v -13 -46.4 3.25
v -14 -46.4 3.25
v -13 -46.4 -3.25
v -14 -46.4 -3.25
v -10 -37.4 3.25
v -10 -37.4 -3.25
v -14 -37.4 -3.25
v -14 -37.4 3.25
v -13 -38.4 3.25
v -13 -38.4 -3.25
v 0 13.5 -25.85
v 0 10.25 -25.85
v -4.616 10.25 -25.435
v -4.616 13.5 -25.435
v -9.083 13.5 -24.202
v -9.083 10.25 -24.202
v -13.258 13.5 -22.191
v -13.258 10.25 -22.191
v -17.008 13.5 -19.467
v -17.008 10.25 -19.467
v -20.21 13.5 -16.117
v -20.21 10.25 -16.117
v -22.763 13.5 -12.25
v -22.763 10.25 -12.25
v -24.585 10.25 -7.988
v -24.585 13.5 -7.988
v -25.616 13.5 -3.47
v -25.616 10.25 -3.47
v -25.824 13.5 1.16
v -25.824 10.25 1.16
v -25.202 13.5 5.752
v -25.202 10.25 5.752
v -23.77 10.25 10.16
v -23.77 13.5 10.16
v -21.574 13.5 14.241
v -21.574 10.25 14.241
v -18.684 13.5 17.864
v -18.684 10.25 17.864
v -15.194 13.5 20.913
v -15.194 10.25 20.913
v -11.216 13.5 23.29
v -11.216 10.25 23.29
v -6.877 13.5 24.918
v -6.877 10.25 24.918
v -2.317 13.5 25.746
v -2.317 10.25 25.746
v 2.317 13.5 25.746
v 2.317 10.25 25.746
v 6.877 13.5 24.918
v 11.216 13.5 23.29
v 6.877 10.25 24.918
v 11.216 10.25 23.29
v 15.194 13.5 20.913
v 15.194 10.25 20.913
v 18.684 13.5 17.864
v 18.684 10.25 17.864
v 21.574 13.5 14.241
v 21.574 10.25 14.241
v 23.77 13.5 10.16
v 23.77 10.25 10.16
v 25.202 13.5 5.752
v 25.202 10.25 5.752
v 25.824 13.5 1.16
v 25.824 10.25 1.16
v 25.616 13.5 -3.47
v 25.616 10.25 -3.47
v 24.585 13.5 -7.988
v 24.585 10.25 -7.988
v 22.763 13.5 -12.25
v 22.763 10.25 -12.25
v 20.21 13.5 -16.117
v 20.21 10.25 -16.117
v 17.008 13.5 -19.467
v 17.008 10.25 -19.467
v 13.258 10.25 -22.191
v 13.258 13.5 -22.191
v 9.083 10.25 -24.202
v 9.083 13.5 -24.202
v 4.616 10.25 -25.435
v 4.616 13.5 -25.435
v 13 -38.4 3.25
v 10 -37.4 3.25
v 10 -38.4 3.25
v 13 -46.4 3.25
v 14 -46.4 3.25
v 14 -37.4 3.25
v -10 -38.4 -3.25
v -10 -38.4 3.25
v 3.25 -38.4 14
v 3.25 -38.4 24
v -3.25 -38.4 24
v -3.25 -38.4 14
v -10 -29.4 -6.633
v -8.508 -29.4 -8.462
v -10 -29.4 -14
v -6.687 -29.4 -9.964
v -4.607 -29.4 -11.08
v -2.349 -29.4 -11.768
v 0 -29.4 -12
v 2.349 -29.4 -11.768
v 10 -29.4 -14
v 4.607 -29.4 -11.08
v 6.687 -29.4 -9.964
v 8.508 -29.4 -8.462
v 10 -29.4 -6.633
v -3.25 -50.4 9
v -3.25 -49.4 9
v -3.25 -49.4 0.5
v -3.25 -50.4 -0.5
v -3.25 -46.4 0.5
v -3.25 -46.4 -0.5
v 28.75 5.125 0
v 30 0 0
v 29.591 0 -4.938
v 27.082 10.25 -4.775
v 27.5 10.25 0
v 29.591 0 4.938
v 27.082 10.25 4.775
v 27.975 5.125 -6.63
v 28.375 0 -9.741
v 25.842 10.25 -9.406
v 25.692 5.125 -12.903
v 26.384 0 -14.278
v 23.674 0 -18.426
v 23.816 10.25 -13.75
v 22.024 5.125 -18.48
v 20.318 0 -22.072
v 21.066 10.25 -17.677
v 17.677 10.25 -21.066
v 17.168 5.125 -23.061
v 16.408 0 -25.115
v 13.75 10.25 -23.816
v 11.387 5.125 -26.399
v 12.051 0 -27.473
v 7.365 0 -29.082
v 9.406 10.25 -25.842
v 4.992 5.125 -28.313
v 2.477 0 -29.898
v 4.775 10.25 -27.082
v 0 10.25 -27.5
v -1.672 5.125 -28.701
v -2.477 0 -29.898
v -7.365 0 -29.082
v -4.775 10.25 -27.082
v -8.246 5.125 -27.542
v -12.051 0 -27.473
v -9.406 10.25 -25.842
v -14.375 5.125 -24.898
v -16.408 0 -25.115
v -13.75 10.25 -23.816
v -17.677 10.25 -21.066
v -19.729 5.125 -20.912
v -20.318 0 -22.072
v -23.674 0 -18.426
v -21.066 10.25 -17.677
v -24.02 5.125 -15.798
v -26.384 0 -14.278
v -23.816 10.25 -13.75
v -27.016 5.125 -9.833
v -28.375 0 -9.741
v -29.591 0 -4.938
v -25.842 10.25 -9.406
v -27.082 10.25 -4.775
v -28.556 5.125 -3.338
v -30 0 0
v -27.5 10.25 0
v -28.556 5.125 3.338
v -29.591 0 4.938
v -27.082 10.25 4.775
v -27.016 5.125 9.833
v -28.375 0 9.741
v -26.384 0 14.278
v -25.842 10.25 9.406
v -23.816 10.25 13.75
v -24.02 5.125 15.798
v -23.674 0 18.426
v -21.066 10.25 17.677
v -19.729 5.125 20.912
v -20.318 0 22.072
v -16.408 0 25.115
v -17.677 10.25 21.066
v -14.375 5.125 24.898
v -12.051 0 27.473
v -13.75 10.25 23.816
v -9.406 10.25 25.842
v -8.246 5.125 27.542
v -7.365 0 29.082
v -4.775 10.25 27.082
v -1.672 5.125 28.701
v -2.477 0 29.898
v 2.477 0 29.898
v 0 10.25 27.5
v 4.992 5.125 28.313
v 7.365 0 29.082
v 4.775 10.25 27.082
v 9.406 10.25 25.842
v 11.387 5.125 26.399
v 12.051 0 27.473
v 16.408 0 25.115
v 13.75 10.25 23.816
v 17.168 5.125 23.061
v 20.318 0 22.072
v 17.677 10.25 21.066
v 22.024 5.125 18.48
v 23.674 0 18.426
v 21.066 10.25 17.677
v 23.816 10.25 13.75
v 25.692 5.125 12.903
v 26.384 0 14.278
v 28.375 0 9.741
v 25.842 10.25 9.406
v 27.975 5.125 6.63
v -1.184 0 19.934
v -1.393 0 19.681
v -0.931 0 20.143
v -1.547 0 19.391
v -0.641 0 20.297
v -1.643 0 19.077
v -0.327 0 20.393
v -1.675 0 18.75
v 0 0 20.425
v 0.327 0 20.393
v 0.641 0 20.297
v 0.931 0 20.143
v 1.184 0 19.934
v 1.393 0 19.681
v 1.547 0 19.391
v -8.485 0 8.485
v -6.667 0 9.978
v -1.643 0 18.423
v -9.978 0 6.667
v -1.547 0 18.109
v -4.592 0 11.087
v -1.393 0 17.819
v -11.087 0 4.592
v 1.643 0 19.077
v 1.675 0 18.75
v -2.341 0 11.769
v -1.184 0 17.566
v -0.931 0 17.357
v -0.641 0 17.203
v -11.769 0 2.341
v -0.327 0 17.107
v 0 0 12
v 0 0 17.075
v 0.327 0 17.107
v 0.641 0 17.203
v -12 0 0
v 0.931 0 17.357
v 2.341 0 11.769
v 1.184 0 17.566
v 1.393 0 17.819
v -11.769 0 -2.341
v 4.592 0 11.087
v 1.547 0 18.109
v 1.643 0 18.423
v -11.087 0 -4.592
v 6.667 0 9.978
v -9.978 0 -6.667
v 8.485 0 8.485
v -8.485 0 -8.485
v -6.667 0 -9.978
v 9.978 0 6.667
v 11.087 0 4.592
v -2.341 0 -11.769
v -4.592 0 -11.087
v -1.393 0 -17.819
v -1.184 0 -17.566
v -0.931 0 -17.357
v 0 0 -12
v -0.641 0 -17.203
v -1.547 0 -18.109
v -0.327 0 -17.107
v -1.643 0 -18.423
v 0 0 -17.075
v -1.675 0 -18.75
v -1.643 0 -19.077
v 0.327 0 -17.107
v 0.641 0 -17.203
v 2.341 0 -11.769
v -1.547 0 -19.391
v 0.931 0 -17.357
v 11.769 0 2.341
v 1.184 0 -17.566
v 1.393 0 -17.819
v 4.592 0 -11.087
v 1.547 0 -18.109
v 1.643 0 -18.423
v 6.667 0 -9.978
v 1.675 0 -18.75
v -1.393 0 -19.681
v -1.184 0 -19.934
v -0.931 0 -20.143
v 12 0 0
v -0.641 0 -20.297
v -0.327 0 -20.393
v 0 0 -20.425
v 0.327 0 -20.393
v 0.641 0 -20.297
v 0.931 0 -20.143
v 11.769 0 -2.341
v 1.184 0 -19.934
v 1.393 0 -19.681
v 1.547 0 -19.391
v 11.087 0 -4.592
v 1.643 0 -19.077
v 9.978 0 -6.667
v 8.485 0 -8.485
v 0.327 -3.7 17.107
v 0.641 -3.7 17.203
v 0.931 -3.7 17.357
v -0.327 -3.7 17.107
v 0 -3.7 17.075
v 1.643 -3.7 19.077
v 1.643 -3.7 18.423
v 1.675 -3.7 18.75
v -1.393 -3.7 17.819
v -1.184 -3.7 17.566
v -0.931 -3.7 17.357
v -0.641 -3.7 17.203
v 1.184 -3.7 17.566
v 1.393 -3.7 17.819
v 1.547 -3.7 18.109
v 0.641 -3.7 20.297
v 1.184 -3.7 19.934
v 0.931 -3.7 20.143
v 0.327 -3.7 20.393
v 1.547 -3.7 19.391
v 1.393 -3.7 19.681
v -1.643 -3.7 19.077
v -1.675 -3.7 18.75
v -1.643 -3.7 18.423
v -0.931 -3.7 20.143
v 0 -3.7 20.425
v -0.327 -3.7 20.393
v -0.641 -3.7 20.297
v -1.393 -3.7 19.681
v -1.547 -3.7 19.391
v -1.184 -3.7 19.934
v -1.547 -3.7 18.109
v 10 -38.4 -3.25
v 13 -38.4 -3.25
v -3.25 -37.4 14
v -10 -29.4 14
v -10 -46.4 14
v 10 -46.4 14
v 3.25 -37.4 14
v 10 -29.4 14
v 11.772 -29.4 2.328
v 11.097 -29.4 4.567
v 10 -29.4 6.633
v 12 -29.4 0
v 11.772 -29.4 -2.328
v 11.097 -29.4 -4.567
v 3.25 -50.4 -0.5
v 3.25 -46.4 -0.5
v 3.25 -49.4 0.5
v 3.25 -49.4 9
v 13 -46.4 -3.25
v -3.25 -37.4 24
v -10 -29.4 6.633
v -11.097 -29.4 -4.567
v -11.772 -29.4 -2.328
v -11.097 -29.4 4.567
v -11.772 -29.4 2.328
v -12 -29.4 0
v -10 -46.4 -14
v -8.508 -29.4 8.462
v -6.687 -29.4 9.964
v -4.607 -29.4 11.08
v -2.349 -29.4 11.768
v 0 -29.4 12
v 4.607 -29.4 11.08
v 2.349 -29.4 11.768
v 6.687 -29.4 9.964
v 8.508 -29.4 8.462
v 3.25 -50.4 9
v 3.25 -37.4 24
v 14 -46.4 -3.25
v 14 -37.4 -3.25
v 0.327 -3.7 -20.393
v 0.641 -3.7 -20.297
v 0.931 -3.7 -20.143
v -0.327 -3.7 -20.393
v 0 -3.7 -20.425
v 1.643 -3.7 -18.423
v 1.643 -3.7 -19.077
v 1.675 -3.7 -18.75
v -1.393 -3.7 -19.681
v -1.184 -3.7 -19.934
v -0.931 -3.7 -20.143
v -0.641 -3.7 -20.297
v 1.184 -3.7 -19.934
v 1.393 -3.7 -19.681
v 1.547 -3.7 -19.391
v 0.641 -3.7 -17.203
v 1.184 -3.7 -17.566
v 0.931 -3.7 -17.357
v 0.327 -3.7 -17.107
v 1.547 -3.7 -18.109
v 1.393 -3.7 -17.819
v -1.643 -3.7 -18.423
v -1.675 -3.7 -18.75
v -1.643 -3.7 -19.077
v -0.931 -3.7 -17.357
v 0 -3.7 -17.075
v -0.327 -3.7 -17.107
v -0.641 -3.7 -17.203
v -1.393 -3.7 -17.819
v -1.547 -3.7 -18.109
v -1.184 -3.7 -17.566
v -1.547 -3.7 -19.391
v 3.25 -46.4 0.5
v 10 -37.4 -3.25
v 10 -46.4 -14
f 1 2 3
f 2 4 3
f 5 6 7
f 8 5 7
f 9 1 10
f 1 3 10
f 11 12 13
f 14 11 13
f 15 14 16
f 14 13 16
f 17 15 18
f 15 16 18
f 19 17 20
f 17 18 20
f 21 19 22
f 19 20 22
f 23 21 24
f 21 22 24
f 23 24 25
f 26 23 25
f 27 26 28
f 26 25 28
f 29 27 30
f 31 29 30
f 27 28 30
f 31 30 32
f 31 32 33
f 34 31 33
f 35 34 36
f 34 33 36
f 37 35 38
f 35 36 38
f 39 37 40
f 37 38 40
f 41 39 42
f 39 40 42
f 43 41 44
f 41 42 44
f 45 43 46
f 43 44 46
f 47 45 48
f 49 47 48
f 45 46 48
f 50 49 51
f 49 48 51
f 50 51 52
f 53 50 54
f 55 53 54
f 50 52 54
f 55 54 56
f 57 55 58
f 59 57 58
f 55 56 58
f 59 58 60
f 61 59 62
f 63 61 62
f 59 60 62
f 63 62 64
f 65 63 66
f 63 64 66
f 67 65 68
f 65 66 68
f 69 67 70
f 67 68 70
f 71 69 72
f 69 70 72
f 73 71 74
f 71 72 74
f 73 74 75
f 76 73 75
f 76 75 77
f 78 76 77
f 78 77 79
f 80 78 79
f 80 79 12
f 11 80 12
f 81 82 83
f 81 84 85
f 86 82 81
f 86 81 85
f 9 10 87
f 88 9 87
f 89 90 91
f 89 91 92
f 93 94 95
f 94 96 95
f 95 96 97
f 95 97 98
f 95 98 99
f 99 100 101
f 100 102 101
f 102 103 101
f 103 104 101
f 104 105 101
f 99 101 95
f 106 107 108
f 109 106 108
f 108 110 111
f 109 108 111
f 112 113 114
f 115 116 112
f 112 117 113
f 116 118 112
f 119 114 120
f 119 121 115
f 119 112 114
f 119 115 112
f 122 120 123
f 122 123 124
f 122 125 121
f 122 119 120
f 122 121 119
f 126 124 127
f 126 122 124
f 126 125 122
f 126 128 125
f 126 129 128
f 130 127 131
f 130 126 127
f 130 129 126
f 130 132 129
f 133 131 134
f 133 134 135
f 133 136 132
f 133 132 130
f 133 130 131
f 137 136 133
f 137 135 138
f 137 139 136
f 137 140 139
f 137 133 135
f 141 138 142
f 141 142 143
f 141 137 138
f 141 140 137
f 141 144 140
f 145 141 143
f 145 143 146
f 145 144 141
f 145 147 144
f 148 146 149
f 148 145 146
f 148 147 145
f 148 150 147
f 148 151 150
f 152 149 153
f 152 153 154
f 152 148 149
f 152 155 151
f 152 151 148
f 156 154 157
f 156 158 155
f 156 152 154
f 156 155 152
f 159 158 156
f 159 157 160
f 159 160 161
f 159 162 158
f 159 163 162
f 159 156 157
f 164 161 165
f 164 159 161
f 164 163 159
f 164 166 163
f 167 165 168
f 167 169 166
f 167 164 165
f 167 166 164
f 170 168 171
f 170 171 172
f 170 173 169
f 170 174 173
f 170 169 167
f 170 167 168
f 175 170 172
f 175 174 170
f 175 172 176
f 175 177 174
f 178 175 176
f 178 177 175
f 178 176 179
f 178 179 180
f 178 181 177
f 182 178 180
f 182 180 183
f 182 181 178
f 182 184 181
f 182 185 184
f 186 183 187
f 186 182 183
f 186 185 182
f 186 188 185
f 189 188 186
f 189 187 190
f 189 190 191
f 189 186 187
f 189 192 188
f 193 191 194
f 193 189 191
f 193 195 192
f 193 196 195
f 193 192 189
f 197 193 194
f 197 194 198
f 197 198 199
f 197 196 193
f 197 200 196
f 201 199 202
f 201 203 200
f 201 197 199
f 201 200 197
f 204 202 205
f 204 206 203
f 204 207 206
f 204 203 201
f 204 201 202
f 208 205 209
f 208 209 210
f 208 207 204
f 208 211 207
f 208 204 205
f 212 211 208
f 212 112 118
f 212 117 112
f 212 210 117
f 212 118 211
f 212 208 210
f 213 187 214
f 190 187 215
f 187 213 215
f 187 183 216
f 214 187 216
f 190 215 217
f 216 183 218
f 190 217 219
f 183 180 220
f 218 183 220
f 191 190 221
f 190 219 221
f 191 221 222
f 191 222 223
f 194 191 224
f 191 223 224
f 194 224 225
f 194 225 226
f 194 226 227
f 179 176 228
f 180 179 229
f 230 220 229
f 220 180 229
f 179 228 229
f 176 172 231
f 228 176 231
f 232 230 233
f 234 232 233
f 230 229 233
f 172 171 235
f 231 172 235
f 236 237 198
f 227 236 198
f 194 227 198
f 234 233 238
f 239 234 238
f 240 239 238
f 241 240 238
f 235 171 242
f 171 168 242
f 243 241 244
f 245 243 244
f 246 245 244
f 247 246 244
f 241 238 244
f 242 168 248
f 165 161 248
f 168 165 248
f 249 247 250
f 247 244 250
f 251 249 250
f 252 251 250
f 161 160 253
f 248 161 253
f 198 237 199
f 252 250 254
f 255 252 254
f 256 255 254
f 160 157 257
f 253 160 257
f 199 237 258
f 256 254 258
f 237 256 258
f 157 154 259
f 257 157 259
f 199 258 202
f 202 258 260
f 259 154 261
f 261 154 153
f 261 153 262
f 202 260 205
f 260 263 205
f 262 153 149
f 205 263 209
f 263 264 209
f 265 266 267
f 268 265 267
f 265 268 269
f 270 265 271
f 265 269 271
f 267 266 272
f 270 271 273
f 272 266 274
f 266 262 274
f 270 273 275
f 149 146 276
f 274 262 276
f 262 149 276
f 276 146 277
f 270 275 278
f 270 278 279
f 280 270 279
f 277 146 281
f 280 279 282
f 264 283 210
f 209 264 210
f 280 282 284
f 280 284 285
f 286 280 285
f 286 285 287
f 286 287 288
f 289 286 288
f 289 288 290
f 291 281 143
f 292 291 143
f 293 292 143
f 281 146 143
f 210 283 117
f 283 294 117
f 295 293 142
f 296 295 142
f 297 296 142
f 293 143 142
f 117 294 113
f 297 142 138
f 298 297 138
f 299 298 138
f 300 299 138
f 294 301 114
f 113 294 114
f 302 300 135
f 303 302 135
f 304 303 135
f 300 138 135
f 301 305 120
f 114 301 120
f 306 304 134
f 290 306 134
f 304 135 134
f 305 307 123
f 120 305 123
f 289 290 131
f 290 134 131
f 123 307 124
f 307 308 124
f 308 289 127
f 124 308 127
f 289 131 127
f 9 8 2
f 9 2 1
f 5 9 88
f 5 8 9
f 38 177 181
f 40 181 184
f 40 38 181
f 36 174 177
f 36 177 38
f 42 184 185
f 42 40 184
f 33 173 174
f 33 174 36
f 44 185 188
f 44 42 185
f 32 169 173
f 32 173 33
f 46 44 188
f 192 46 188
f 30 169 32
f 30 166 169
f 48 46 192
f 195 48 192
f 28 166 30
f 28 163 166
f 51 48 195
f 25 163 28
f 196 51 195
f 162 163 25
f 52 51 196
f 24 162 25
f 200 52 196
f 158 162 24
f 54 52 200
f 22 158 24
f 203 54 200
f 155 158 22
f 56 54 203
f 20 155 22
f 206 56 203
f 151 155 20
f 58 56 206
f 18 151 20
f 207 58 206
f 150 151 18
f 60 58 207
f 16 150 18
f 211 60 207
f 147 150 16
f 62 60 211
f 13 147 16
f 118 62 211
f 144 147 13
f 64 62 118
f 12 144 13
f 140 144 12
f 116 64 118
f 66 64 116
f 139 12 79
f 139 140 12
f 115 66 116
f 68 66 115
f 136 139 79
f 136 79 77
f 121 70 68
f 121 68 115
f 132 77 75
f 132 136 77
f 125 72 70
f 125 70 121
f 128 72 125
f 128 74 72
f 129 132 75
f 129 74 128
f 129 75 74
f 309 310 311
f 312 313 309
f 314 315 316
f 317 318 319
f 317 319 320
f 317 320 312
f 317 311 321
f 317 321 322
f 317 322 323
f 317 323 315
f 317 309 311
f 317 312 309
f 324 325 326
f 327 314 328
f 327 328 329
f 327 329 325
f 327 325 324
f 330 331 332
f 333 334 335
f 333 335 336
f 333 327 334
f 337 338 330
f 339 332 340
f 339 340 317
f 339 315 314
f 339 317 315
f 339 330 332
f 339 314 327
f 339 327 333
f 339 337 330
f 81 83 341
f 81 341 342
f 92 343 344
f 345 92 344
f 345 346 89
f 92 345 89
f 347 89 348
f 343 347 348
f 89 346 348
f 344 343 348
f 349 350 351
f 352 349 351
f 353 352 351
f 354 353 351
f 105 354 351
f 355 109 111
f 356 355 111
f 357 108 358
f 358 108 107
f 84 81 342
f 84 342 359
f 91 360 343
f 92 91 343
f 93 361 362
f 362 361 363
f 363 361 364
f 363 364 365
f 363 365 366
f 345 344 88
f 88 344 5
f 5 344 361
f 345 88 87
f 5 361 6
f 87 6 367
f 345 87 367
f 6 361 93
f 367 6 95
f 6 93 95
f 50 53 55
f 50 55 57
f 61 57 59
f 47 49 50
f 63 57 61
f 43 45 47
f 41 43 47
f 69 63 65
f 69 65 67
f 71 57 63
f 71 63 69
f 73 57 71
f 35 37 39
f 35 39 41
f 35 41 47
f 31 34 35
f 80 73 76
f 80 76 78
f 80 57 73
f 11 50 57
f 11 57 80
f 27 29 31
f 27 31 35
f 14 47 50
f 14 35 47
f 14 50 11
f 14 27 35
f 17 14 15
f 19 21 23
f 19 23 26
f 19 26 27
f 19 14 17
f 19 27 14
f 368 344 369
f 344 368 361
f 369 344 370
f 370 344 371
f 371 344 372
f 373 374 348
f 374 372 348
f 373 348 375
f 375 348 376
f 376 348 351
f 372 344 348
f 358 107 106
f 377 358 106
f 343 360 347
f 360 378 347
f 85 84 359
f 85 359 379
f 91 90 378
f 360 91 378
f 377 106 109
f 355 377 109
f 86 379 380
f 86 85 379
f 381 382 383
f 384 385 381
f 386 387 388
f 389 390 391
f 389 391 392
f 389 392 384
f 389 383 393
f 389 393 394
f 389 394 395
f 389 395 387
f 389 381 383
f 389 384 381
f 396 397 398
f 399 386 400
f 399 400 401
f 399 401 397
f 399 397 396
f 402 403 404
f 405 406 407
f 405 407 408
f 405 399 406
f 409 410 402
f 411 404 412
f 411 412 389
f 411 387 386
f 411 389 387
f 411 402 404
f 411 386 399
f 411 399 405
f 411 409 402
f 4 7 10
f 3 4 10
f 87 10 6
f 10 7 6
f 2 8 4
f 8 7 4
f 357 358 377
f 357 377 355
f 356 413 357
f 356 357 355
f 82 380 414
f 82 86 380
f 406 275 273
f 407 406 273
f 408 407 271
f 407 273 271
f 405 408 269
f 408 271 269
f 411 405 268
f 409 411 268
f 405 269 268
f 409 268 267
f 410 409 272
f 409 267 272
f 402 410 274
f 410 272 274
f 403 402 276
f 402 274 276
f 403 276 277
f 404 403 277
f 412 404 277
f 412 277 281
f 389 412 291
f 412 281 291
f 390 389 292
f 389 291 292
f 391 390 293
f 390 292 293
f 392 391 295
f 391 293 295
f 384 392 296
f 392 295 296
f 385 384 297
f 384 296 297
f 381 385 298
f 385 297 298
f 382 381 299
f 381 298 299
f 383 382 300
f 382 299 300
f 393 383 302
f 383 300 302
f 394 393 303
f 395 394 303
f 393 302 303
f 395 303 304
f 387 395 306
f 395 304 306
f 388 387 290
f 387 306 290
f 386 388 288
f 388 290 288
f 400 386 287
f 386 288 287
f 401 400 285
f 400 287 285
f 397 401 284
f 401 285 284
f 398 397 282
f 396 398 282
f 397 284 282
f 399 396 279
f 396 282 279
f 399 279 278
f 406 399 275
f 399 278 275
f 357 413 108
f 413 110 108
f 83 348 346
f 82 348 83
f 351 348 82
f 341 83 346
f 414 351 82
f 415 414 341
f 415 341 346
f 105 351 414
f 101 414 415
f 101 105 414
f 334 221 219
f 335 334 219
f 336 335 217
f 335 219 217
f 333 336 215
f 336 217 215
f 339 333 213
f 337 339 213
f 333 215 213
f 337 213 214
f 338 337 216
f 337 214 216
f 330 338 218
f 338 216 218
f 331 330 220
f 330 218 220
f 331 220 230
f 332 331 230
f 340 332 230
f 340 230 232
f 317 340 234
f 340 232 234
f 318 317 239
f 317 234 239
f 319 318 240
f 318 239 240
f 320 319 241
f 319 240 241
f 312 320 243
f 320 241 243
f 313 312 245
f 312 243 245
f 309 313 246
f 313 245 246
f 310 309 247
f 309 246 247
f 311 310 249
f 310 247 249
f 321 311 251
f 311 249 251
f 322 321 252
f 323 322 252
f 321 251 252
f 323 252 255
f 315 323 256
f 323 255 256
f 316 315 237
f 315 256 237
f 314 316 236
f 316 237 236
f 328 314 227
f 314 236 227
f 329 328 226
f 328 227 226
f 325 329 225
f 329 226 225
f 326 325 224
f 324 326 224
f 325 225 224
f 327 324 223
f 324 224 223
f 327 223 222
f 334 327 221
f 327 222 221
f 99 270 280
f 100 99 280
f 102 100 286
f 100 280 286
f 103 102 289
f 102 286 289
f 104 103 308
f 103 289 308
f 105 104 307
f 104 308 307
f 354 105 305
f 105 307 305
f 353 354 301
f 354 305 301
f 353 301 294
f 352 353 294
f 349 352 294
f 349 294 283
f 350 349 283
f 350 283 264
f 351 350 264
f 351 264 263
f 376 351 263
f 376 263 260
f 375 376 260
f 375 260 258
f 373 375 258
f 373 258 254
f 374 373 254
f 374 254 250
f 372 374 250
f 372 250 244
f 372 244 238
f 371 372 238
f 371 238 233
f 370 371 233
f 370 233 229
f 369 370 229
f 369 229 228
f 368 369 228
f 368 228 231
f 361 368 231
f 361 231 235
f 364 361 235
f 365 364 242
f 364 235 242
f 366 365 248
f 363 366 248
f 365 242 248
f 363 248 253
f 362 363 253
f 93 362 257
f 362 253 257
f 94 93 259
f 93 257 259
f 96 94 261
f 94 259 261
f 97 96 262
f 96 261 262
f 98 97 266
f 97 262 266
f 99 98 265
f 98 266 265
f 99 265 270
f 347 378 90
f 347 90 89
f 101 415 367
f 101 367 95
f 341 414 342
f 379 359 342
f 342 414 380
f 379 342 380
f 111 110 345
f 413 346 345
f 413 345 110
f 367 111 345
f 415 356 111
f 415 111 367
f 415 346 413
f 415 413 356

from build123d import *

# Parameters (mm, degrees)
SKETCH1_R             = 30
SKETCH2_R             = 27.5
SKETCH3_R             = 25.85
BUTTON_DEPTH          = 3.25
SKETCH4_R             = 12
THREAD_DEPTH          = 29.4
SKETCH5_R             = 1.675
ALIGNMENT_STUDS_DEPTH = 3.7
BOSS_EXTRUDE1_DEPTH   = 10
SKETCH6_3_W           = 10
SKETCH6_3_H           = 1
BOSS_EXTRUDE2_DEPTH   = 3.25
BOSS_EXTRUDE3_DEPTH   = 3.25


with BuildPart() as part:
    # Sketch1 → Frame section 0
    with BuildSketch(Plane(origin=(0, 0, 0), x_dir=(1, 0, 0), z_dir=(0, 1, 0))):
        Circle(SKETCH1_R)
    # Sketch2 → Frame section 1
    with BuildSketch(Plane(origin=(0, 10.25, 0), x_dir=(1, 0, 0), z_dir=(0, 1, 0))):
        Circle(SKETCH2_R)
    loft()

    # Sketch3 → Button (add)
    with BuildSketch(Plane(origin=(0, 10.25, 0), x_dir=(1, 0, 0), z_dir=(0, 1, 0))):
        Circle(SKETCH3_R)
    extrude(amount=BUTTON_DEPTH)

    # Sketch4 → Thread (add)
    with BuildSketch(Plane.XZ):
        Circle(SKETCH4_R)
    extrude(amount=THREAD_DEPTH)

    # Sketch5 → Alignment studs (add)
    with BuildSketch(Plane.XZ):
        with Locations((0, 18.75)):
            Circle(SKETCH5_R)
        with Locations((0, -18.75)):
            Circle(SKETCH5_R)
    extrude(amount=ALIGNMENT_STUDS_DEPTH)

    # Sketch6 → Boss-Extrude1 (add, symmetric)
    with BuildSketch(Plane(origin=(0, 0, 0), x_dir=(0, 0, -1), z_dir=(1, 0, 0))):
        Polygon((14, -46.4), (14, -29.4), (-14, -29.4), (-14, -37.4), (-14, -38.4), (-14, -46.4), (-0.5, -46.4), (0.5, -46.4), align=None)
    extrude(amount=BOSS_EXTRUDE1_DEPTH, both=True)

    # Sketch6<3> → Boss-Extrude2 (add, symmetric)
    with BuildSketch(Plane(origin=(0, 0, 0), x_dir=(0, 0, -1), z_dir=(1, 0, 0))):
        with Locations((-19, -37.9)):
            Rectangle(SKETCH6_3_W, SKETCH6_3_H)
        Polygon((0.5, -50.4), (0.5, -46.4), (-0.5, -46.4), (-0.5, -49.4), (-9, -49.4), (-9, -50.4), align=None)
    extrude(amount=BOSS_EXTRUDE2_DEPTH, both=True)

    # Sketch7 → Boss-Extrude3 (add, symmetric)
    with BuildSketch(Plane.XY):
        Polygon((-10, -37.4), (-14, -37.4), (-14, -46.4), (-13, -46.4), (-13, -38.4), (-10, -38.4), align=None)
        Polygon((10, -37.4), (10, -38.4), (13, -38.4), (13, -46.4), (14, -46.4), (14, -37.4), align=None)
    extrude(amount=BOSS_EXTRUDE3_DEPTH, both=True)


solid = part.part
